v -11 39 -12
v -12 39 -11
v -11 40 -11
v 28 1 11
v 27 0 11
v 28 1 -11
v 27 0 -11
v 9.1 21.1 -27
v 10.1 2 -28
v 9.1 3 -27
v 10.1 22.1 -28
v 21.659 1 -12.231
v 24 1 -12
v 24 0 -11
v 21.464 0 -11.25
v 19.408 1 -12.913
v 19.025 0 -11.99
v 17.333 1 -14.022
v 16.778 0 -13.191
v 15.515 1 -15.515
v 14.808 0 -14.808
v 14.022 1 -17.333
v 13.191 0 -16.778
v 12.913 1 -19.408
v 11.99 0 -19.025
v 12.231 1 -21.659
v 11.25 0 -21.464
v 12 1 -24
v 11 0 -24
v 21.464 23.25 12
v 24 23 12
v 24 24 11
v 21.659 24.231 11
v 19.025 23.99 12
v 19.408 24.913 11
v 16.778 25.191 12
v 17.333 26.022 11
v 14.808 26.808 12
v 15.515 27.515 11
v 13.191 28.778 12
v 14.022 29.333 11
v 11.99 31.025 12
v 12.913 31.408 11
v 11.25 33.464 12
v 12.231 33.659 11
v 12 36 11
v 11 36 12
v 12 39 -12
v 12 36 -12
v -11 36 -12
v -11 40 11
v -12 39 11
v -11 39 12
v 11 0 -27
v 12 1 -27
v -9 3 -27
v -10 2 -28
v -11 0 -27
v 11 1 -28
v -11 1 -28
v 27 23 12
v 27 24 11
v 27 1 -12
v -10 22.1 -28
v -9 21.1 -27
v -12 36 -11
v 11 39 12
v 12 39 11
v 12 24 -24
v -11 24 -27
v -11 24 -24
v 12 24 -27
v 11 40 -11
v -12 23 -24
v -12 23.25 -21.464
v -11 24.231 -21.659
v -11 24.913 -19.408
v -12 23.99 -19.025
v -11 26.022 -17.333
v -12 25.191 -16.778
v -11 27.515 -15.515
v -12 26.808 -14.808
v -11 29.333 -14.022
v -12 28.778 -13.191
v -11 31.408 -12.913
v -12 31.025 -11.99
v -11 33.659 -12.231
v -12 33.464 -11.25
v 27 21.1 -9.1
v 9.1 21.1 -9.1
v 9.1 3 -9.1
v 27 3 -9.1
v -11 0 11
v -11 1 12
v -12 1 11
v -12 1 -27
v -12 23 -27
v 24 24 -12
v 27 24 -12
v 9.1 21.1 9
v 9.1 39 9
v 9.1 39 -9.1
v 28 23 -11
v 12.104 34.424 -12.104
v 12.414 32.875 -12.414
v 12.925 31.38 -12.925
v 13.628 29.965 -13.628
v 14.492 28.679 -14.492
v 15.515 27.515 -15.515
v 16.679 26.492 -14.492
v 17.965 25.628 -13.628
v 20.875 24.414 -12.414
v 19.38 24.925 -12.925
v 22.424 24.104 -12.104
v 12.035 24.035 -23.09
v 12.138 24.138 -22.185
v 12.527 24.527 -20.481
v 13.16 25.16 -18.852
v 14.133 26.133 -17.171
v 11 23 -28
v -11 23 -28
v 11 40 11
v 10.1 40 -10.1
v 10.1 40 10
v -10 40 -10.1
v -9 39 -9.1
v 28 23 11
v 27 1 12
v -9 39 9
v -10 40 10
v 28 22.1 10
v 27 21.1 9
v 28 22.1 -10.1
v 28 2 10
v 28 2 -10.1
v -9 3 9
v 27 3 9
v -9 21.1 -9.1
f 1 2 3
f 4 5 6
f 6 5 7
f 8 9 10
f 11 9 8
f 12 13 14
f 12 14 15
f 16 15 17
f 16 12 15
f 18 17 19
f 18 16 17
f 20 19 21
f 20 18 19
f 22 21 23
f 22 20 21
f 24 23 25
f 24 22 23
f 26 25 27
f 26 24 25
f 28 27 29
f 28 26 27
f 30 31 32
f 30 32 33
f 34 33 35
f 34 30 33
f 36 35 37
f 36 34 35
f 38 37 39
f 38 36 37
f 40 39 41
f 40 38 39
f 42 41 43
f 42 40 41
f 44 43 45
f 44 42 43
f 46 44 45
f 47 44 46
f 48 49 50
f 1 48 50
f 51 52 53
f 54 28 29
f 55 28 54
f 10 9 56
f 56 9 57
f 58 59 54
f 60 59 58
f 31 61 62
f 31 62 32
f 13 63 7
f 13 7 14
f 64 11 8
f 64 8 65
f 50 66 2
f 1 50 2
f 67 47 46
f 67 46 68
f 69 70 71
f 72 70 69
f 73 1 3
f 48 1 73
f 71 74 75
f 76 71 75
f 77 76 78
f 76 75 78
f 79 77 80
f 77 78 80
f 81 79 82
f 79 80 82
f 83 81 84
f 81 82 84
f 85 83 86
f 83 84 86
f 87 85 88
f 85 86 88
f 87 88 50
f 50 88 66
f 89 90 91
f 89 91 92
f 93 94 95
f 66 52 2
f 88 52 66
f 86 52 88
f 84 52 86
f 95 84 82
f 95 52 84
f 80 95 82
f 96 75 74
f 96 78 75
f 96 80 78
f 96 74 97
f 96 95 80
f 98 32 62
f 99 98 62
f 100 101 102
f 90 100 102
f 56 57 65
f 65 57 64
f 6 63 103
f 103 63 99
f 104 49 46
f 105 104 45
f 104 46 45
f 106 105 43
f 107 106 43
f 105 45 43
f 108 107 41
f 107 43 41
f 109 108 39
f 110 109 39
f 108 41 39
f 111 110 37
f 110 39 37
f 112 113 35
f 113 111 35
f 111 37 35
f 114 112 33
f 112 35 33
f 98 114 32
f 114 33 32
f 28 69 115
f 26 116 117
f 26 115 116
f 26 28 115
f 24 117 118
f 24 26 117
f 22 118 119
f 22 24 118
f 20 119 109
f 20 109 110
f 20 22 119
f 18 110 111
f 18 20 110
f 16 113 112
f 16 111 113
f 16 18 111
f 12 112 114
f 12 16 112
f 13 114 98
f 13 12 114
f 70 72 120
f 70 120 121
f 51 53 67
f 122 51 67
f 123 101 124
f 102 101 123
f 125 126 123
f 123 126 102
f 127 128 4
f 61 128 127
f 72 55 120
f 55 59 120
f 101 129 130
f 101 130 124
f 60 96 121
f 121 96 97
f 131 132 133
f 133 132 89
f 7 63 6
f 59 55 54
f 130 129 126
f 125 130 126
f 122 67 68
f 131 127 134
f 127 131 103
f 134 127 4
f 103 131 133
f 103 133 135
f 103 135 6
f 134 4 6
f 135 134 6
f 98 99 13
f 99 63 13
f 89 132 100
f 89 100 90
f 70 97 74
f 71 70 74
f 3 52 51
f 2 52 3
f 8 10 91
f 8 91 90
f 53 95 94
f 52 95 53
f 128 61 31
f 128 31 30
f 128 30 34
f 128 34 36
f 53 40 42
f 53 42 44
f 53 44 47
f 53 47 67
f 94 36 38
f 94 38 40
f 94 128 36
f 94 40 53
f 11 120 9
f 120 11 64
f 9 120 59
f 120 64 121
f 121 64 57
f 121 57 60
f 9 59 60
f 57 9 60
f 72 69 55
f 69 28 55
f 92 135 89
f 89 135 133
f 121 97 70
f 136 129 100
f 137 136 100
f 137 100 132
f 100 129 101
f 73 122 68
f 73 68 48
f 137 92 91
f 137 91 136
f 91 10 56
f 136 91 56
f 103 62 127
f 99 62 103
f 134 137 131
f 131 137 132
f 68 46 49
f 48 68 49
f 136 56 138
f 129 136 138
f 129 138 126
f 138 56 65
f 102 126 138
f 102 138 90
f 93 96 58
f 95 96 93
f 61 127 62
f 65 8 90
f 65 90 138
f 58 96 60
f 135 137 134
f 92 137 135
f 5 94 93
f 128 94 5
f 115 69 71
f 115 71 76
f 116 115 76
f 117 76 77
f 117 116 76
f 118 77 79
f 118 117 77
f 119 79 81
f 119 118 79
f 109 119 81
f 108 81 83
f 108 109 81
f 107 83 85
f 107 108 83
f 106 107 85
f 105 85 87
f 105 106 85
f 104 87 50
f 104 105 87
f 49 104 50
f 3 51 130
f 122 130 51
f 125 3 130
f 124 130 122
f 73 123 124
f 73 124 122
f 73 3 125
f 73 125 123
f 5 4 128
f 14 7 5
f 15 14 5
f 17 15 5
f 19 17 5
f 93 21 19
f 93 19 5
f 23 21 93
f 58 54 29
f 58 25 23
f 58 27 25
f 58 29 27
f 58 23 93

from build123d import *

# Parameters (mm, degrees)
BOSS_EXTRUDE1_DEPTH = 24
SKETCH2_W           = 24
SKETCH2_H           = 24
BOSS_EXTRUDE2_DEPTH = 16
FILLET1_R           = 12
FILLET2_R           = 12
SKETCH3_W           = 18.1
SKETCH3_H           = 18.1
CUT_EXTRUDE1_DEPTH  = 37
SKETCH4_W           = 18.1
SKETCH4_H           = 18.1
CUT_EXTRUDE2_DEPTH  = 37
SKETCH5_W           = 18.1
SKETCH5_H           = 18.1
CUT_EXTRUDE3_DEPTH  = 37
CHAMFER1_SIZE       = 1


with BuildPart() as part:
    # Sketch1 → Boss-Extrude1 (new body)
    with BuildSketch(Plane(origin=(0, 0, 0), x_dir=(1, 0, 0), z_dir=(0, 1, 0))):
        Polygon((-12, 28), (-12, -12), (28, -12), (28, 12), (12, 12), (12, 28), align=None)
    extrude(amount=BOSS_EXTRUDE1_DEPTH)

    # Sketch2 → Boss-Extrude2 (add)
    with BuildSketch(Plane(origin=(0, 24, 0), x_dir=(1, 0, 0), z_dir=(0, 1, 0))):
        Rectangle(SKETCH2_W, SKETCH2_H)
    extrude(amount=BOSS_EXTRUDE2_DEPTH)

    # Fillet1
    # the kernel refuses this fillet: 12 mm, written as the material it adds along each edge
    with BuildSketch(Plane(origin=(12, 24, 12), x_dir=(1, 0, 0), z_dir=(0, 0, -1))) as fillet1_piece_1:
        with BuildLine():
            CenterArc((FILLET1_R, -FILLET1_R), FILLET1_R, 90, 90)
            Line((0, -FILLET1_R), (0, 0))
            Line((0, 0), (FILLET1_R, 0))
        make_face()
    extrude(amount=24)

    # Fillet2
    # the kernel refuses this fillet: 12 mm, written as the material it adds along each edge
    with BuildSketch(Plane(origin=(12, 0, -12), x_dir=(1, 0, 0), z_dir=(0, 1, 0)), Plane(origin=(12, 24, -12), x_dir=(0, 1, 0), z_dir=(-1, 0, 0))) as fillet2_piece_1:
        with BuildLine():
            CenterArc((FILLET2_R, FILLET2_R), FILLET2_R, 180, 90)
            Line((0, FILLET2_R), (0, 0))
            Line((0, 0), (FILLET2_R, 0))
        make_face()
    extrude(amount=24)
    with BuildSketch(Plane(origin=(42, 24, -12), x_dir=(0, 1, 0), z_dir=(-1, 0, 0))) as fillet2_piece_2a_section:
        with BuildLine():
            CenterArc((FILLET2_R, FILLET2_R), FILLET2_R, 180, 90)
            Line((0, FILLET2_R), (0, 0))
            Line((0, 0), (FILLET2_R, 0))
        make_face()
    fillet2_piece_2a = extrude(amount=54, mode=Mode.PRIVATE)
    fillet2_piece_2a = fillet2_piece_2a - Plane(origin=(24, 36, -15.874937315), x_dir=(1, 0, 0), z_dir=(0, 0, 1)) * Cylinder(12, 156, mode=Mode.PRIVATE)
    fillet2_piece_2a = split(fillet2_piece_2a, bisect_by=Plane(origin=(28, 25.203397989, -15.874937315), z_dir=(-1, 0, 0)), keep=Keep.TOP, mode=Mode.PRIVATE)
    fillet2_piece_2a = split(fillet2_piece_2a, bisect_by=Plane(origin=(12, 25.203397989, -15.874937315), z_dir=(1, 0, 0)), keep=Keep.TOP, mode=Mode.PRIVATE)
    with BuildSketch(Plane(origin=(12, 0, -12), x_dir=(1, 0, 0), z_dir=(0, 1, 0))) as fillet2_piece_2b_section:
        with BuildLine():
            CenterArc((FILLET2_R, FILLET2_R), FILLET2_R, 180, 90)
            Line((0, FILLET2_R), (0, 0))
            Line((0, 0), (FILLET2_R, 0))
        make_face()
    fillet2_piece_2b = extrude(amount=54, mode=Mode.PRIVATE)
    fillet2_piece_2b = fillet2_piece_2b - Plane(origin=(24, 36, -15.874937326), x_dir=(1, 0, 0), z_dir=(0, 0, 1)) * Cylinder(12, 156, mode=Mode.PRIVATE)
    fillet2_piece_2b = split(fillet2_piece_2b, bisect_by=Plane(origin=(13.203398, 24, -15.874937326), z_dir=(0, 1, 0)), keep=Keep.TOP, mode=Mode.PRIVATE)
    fillet2_piece_2b = split(fillet2_piece_2b, bisect_by=Plane(origin=(13.203398, 40, -15.874937326), z_dir=(0, -1, 0)), keep=Keep.TOP, mode=Mode.PRIVATE)
    fillet2_piece_2 = fillet2_piece_2a & fillet2_piece_2b
    add(fillet2_piece_2)

    # Sketch3 → Cut-Extrude1 (cut)
    with BuildSketch(Plane(origin=(28, 0, 0), x_dir=(0, 0, -1), z_dir=(1, 0, 0))):
        with Locations((0.05, 12.05)):
            Rectangle(SKETCH3_W, SKETCH3_H)
    extrude(amount=-CUT_EXTRUDE1_DEPTH, mode=Mode.SUBTRACT)

    # Sketch4 → Cut-Extrude2 (cut)
    with BuildSketch(Plane(origin=(0, 40, 0), x_dir=(1, 0, 0), z_dir=(0, 1, 0))):
        with Locations((0.05, 0.05)):
            Rectangle(SKETCH4_W, SKETCH4_H)
    extrude(amount=-CUT_EXTRUDE2_DEPTH, mode=Mode.SUBTRACT)

    # Sketch5 → Cut-Extrude3 (cut)
    with BuildSketch(Plane(origin=(0, 0, -28), x_dir=(-1, 0, 0), z_dir=(0, 0, -1))):
        with Locations((-0.05, 12.05)):
            Rectangle(SKETCH5_W, SKETCH5_H)
    extrude(amount=-CUT_EXTRUDE3_DEPTH, mode=Mode.SUBTRACT)

    # Chamfer1
    chamfer1_edges = [part.edges().sort_by_distance(p)[0] for p in [
        (12, 12, -28),
        (28, 12, -12),
        (28, 12, 12),
        (-12, 20, 12),
        (-12, 12, -28),
        (28, 24, 0),
        (-12, 38, -12),
        (12, 38, 12),
        (-12, 40, 0),
        (0, 40, 12),
        (12, 40, 0),
        (0, 40, -12),
        (26, 24, 12),
        (15.514718626, 27.514718626, 12),
        (0, 24, -28),
        (12, 0, -26),
        (15.514718626, 0, -15.514718626),
        (-12, 27.514718626, -15.514718626),
        (28, 12.05, -9.1),
        (28, 21.1, -0.05),
        (28, 12.05, 9),
        (28, 3, -0.05),
        (26, 0, -12),
        (28, 0, 0),
        (-12, 24, -26),
        (8, 0, 12),
        (9.1, 40, -0.05),
        (0.05, 40, -9.1),
        (-9, 40, -0.05),
        (0.05, 40, 9),
        (-12, 0, -8),
        (0, 0, -28),
        (-9, 12.05, -28),
        (0.05, 21.1, -28),
        (9.1, 12.05, -28),
        (0.05, 3, -28),
    ]]
    chamfer(chamfer1_edges, length=CHAMFER1_SIZE)


solid = part.part
